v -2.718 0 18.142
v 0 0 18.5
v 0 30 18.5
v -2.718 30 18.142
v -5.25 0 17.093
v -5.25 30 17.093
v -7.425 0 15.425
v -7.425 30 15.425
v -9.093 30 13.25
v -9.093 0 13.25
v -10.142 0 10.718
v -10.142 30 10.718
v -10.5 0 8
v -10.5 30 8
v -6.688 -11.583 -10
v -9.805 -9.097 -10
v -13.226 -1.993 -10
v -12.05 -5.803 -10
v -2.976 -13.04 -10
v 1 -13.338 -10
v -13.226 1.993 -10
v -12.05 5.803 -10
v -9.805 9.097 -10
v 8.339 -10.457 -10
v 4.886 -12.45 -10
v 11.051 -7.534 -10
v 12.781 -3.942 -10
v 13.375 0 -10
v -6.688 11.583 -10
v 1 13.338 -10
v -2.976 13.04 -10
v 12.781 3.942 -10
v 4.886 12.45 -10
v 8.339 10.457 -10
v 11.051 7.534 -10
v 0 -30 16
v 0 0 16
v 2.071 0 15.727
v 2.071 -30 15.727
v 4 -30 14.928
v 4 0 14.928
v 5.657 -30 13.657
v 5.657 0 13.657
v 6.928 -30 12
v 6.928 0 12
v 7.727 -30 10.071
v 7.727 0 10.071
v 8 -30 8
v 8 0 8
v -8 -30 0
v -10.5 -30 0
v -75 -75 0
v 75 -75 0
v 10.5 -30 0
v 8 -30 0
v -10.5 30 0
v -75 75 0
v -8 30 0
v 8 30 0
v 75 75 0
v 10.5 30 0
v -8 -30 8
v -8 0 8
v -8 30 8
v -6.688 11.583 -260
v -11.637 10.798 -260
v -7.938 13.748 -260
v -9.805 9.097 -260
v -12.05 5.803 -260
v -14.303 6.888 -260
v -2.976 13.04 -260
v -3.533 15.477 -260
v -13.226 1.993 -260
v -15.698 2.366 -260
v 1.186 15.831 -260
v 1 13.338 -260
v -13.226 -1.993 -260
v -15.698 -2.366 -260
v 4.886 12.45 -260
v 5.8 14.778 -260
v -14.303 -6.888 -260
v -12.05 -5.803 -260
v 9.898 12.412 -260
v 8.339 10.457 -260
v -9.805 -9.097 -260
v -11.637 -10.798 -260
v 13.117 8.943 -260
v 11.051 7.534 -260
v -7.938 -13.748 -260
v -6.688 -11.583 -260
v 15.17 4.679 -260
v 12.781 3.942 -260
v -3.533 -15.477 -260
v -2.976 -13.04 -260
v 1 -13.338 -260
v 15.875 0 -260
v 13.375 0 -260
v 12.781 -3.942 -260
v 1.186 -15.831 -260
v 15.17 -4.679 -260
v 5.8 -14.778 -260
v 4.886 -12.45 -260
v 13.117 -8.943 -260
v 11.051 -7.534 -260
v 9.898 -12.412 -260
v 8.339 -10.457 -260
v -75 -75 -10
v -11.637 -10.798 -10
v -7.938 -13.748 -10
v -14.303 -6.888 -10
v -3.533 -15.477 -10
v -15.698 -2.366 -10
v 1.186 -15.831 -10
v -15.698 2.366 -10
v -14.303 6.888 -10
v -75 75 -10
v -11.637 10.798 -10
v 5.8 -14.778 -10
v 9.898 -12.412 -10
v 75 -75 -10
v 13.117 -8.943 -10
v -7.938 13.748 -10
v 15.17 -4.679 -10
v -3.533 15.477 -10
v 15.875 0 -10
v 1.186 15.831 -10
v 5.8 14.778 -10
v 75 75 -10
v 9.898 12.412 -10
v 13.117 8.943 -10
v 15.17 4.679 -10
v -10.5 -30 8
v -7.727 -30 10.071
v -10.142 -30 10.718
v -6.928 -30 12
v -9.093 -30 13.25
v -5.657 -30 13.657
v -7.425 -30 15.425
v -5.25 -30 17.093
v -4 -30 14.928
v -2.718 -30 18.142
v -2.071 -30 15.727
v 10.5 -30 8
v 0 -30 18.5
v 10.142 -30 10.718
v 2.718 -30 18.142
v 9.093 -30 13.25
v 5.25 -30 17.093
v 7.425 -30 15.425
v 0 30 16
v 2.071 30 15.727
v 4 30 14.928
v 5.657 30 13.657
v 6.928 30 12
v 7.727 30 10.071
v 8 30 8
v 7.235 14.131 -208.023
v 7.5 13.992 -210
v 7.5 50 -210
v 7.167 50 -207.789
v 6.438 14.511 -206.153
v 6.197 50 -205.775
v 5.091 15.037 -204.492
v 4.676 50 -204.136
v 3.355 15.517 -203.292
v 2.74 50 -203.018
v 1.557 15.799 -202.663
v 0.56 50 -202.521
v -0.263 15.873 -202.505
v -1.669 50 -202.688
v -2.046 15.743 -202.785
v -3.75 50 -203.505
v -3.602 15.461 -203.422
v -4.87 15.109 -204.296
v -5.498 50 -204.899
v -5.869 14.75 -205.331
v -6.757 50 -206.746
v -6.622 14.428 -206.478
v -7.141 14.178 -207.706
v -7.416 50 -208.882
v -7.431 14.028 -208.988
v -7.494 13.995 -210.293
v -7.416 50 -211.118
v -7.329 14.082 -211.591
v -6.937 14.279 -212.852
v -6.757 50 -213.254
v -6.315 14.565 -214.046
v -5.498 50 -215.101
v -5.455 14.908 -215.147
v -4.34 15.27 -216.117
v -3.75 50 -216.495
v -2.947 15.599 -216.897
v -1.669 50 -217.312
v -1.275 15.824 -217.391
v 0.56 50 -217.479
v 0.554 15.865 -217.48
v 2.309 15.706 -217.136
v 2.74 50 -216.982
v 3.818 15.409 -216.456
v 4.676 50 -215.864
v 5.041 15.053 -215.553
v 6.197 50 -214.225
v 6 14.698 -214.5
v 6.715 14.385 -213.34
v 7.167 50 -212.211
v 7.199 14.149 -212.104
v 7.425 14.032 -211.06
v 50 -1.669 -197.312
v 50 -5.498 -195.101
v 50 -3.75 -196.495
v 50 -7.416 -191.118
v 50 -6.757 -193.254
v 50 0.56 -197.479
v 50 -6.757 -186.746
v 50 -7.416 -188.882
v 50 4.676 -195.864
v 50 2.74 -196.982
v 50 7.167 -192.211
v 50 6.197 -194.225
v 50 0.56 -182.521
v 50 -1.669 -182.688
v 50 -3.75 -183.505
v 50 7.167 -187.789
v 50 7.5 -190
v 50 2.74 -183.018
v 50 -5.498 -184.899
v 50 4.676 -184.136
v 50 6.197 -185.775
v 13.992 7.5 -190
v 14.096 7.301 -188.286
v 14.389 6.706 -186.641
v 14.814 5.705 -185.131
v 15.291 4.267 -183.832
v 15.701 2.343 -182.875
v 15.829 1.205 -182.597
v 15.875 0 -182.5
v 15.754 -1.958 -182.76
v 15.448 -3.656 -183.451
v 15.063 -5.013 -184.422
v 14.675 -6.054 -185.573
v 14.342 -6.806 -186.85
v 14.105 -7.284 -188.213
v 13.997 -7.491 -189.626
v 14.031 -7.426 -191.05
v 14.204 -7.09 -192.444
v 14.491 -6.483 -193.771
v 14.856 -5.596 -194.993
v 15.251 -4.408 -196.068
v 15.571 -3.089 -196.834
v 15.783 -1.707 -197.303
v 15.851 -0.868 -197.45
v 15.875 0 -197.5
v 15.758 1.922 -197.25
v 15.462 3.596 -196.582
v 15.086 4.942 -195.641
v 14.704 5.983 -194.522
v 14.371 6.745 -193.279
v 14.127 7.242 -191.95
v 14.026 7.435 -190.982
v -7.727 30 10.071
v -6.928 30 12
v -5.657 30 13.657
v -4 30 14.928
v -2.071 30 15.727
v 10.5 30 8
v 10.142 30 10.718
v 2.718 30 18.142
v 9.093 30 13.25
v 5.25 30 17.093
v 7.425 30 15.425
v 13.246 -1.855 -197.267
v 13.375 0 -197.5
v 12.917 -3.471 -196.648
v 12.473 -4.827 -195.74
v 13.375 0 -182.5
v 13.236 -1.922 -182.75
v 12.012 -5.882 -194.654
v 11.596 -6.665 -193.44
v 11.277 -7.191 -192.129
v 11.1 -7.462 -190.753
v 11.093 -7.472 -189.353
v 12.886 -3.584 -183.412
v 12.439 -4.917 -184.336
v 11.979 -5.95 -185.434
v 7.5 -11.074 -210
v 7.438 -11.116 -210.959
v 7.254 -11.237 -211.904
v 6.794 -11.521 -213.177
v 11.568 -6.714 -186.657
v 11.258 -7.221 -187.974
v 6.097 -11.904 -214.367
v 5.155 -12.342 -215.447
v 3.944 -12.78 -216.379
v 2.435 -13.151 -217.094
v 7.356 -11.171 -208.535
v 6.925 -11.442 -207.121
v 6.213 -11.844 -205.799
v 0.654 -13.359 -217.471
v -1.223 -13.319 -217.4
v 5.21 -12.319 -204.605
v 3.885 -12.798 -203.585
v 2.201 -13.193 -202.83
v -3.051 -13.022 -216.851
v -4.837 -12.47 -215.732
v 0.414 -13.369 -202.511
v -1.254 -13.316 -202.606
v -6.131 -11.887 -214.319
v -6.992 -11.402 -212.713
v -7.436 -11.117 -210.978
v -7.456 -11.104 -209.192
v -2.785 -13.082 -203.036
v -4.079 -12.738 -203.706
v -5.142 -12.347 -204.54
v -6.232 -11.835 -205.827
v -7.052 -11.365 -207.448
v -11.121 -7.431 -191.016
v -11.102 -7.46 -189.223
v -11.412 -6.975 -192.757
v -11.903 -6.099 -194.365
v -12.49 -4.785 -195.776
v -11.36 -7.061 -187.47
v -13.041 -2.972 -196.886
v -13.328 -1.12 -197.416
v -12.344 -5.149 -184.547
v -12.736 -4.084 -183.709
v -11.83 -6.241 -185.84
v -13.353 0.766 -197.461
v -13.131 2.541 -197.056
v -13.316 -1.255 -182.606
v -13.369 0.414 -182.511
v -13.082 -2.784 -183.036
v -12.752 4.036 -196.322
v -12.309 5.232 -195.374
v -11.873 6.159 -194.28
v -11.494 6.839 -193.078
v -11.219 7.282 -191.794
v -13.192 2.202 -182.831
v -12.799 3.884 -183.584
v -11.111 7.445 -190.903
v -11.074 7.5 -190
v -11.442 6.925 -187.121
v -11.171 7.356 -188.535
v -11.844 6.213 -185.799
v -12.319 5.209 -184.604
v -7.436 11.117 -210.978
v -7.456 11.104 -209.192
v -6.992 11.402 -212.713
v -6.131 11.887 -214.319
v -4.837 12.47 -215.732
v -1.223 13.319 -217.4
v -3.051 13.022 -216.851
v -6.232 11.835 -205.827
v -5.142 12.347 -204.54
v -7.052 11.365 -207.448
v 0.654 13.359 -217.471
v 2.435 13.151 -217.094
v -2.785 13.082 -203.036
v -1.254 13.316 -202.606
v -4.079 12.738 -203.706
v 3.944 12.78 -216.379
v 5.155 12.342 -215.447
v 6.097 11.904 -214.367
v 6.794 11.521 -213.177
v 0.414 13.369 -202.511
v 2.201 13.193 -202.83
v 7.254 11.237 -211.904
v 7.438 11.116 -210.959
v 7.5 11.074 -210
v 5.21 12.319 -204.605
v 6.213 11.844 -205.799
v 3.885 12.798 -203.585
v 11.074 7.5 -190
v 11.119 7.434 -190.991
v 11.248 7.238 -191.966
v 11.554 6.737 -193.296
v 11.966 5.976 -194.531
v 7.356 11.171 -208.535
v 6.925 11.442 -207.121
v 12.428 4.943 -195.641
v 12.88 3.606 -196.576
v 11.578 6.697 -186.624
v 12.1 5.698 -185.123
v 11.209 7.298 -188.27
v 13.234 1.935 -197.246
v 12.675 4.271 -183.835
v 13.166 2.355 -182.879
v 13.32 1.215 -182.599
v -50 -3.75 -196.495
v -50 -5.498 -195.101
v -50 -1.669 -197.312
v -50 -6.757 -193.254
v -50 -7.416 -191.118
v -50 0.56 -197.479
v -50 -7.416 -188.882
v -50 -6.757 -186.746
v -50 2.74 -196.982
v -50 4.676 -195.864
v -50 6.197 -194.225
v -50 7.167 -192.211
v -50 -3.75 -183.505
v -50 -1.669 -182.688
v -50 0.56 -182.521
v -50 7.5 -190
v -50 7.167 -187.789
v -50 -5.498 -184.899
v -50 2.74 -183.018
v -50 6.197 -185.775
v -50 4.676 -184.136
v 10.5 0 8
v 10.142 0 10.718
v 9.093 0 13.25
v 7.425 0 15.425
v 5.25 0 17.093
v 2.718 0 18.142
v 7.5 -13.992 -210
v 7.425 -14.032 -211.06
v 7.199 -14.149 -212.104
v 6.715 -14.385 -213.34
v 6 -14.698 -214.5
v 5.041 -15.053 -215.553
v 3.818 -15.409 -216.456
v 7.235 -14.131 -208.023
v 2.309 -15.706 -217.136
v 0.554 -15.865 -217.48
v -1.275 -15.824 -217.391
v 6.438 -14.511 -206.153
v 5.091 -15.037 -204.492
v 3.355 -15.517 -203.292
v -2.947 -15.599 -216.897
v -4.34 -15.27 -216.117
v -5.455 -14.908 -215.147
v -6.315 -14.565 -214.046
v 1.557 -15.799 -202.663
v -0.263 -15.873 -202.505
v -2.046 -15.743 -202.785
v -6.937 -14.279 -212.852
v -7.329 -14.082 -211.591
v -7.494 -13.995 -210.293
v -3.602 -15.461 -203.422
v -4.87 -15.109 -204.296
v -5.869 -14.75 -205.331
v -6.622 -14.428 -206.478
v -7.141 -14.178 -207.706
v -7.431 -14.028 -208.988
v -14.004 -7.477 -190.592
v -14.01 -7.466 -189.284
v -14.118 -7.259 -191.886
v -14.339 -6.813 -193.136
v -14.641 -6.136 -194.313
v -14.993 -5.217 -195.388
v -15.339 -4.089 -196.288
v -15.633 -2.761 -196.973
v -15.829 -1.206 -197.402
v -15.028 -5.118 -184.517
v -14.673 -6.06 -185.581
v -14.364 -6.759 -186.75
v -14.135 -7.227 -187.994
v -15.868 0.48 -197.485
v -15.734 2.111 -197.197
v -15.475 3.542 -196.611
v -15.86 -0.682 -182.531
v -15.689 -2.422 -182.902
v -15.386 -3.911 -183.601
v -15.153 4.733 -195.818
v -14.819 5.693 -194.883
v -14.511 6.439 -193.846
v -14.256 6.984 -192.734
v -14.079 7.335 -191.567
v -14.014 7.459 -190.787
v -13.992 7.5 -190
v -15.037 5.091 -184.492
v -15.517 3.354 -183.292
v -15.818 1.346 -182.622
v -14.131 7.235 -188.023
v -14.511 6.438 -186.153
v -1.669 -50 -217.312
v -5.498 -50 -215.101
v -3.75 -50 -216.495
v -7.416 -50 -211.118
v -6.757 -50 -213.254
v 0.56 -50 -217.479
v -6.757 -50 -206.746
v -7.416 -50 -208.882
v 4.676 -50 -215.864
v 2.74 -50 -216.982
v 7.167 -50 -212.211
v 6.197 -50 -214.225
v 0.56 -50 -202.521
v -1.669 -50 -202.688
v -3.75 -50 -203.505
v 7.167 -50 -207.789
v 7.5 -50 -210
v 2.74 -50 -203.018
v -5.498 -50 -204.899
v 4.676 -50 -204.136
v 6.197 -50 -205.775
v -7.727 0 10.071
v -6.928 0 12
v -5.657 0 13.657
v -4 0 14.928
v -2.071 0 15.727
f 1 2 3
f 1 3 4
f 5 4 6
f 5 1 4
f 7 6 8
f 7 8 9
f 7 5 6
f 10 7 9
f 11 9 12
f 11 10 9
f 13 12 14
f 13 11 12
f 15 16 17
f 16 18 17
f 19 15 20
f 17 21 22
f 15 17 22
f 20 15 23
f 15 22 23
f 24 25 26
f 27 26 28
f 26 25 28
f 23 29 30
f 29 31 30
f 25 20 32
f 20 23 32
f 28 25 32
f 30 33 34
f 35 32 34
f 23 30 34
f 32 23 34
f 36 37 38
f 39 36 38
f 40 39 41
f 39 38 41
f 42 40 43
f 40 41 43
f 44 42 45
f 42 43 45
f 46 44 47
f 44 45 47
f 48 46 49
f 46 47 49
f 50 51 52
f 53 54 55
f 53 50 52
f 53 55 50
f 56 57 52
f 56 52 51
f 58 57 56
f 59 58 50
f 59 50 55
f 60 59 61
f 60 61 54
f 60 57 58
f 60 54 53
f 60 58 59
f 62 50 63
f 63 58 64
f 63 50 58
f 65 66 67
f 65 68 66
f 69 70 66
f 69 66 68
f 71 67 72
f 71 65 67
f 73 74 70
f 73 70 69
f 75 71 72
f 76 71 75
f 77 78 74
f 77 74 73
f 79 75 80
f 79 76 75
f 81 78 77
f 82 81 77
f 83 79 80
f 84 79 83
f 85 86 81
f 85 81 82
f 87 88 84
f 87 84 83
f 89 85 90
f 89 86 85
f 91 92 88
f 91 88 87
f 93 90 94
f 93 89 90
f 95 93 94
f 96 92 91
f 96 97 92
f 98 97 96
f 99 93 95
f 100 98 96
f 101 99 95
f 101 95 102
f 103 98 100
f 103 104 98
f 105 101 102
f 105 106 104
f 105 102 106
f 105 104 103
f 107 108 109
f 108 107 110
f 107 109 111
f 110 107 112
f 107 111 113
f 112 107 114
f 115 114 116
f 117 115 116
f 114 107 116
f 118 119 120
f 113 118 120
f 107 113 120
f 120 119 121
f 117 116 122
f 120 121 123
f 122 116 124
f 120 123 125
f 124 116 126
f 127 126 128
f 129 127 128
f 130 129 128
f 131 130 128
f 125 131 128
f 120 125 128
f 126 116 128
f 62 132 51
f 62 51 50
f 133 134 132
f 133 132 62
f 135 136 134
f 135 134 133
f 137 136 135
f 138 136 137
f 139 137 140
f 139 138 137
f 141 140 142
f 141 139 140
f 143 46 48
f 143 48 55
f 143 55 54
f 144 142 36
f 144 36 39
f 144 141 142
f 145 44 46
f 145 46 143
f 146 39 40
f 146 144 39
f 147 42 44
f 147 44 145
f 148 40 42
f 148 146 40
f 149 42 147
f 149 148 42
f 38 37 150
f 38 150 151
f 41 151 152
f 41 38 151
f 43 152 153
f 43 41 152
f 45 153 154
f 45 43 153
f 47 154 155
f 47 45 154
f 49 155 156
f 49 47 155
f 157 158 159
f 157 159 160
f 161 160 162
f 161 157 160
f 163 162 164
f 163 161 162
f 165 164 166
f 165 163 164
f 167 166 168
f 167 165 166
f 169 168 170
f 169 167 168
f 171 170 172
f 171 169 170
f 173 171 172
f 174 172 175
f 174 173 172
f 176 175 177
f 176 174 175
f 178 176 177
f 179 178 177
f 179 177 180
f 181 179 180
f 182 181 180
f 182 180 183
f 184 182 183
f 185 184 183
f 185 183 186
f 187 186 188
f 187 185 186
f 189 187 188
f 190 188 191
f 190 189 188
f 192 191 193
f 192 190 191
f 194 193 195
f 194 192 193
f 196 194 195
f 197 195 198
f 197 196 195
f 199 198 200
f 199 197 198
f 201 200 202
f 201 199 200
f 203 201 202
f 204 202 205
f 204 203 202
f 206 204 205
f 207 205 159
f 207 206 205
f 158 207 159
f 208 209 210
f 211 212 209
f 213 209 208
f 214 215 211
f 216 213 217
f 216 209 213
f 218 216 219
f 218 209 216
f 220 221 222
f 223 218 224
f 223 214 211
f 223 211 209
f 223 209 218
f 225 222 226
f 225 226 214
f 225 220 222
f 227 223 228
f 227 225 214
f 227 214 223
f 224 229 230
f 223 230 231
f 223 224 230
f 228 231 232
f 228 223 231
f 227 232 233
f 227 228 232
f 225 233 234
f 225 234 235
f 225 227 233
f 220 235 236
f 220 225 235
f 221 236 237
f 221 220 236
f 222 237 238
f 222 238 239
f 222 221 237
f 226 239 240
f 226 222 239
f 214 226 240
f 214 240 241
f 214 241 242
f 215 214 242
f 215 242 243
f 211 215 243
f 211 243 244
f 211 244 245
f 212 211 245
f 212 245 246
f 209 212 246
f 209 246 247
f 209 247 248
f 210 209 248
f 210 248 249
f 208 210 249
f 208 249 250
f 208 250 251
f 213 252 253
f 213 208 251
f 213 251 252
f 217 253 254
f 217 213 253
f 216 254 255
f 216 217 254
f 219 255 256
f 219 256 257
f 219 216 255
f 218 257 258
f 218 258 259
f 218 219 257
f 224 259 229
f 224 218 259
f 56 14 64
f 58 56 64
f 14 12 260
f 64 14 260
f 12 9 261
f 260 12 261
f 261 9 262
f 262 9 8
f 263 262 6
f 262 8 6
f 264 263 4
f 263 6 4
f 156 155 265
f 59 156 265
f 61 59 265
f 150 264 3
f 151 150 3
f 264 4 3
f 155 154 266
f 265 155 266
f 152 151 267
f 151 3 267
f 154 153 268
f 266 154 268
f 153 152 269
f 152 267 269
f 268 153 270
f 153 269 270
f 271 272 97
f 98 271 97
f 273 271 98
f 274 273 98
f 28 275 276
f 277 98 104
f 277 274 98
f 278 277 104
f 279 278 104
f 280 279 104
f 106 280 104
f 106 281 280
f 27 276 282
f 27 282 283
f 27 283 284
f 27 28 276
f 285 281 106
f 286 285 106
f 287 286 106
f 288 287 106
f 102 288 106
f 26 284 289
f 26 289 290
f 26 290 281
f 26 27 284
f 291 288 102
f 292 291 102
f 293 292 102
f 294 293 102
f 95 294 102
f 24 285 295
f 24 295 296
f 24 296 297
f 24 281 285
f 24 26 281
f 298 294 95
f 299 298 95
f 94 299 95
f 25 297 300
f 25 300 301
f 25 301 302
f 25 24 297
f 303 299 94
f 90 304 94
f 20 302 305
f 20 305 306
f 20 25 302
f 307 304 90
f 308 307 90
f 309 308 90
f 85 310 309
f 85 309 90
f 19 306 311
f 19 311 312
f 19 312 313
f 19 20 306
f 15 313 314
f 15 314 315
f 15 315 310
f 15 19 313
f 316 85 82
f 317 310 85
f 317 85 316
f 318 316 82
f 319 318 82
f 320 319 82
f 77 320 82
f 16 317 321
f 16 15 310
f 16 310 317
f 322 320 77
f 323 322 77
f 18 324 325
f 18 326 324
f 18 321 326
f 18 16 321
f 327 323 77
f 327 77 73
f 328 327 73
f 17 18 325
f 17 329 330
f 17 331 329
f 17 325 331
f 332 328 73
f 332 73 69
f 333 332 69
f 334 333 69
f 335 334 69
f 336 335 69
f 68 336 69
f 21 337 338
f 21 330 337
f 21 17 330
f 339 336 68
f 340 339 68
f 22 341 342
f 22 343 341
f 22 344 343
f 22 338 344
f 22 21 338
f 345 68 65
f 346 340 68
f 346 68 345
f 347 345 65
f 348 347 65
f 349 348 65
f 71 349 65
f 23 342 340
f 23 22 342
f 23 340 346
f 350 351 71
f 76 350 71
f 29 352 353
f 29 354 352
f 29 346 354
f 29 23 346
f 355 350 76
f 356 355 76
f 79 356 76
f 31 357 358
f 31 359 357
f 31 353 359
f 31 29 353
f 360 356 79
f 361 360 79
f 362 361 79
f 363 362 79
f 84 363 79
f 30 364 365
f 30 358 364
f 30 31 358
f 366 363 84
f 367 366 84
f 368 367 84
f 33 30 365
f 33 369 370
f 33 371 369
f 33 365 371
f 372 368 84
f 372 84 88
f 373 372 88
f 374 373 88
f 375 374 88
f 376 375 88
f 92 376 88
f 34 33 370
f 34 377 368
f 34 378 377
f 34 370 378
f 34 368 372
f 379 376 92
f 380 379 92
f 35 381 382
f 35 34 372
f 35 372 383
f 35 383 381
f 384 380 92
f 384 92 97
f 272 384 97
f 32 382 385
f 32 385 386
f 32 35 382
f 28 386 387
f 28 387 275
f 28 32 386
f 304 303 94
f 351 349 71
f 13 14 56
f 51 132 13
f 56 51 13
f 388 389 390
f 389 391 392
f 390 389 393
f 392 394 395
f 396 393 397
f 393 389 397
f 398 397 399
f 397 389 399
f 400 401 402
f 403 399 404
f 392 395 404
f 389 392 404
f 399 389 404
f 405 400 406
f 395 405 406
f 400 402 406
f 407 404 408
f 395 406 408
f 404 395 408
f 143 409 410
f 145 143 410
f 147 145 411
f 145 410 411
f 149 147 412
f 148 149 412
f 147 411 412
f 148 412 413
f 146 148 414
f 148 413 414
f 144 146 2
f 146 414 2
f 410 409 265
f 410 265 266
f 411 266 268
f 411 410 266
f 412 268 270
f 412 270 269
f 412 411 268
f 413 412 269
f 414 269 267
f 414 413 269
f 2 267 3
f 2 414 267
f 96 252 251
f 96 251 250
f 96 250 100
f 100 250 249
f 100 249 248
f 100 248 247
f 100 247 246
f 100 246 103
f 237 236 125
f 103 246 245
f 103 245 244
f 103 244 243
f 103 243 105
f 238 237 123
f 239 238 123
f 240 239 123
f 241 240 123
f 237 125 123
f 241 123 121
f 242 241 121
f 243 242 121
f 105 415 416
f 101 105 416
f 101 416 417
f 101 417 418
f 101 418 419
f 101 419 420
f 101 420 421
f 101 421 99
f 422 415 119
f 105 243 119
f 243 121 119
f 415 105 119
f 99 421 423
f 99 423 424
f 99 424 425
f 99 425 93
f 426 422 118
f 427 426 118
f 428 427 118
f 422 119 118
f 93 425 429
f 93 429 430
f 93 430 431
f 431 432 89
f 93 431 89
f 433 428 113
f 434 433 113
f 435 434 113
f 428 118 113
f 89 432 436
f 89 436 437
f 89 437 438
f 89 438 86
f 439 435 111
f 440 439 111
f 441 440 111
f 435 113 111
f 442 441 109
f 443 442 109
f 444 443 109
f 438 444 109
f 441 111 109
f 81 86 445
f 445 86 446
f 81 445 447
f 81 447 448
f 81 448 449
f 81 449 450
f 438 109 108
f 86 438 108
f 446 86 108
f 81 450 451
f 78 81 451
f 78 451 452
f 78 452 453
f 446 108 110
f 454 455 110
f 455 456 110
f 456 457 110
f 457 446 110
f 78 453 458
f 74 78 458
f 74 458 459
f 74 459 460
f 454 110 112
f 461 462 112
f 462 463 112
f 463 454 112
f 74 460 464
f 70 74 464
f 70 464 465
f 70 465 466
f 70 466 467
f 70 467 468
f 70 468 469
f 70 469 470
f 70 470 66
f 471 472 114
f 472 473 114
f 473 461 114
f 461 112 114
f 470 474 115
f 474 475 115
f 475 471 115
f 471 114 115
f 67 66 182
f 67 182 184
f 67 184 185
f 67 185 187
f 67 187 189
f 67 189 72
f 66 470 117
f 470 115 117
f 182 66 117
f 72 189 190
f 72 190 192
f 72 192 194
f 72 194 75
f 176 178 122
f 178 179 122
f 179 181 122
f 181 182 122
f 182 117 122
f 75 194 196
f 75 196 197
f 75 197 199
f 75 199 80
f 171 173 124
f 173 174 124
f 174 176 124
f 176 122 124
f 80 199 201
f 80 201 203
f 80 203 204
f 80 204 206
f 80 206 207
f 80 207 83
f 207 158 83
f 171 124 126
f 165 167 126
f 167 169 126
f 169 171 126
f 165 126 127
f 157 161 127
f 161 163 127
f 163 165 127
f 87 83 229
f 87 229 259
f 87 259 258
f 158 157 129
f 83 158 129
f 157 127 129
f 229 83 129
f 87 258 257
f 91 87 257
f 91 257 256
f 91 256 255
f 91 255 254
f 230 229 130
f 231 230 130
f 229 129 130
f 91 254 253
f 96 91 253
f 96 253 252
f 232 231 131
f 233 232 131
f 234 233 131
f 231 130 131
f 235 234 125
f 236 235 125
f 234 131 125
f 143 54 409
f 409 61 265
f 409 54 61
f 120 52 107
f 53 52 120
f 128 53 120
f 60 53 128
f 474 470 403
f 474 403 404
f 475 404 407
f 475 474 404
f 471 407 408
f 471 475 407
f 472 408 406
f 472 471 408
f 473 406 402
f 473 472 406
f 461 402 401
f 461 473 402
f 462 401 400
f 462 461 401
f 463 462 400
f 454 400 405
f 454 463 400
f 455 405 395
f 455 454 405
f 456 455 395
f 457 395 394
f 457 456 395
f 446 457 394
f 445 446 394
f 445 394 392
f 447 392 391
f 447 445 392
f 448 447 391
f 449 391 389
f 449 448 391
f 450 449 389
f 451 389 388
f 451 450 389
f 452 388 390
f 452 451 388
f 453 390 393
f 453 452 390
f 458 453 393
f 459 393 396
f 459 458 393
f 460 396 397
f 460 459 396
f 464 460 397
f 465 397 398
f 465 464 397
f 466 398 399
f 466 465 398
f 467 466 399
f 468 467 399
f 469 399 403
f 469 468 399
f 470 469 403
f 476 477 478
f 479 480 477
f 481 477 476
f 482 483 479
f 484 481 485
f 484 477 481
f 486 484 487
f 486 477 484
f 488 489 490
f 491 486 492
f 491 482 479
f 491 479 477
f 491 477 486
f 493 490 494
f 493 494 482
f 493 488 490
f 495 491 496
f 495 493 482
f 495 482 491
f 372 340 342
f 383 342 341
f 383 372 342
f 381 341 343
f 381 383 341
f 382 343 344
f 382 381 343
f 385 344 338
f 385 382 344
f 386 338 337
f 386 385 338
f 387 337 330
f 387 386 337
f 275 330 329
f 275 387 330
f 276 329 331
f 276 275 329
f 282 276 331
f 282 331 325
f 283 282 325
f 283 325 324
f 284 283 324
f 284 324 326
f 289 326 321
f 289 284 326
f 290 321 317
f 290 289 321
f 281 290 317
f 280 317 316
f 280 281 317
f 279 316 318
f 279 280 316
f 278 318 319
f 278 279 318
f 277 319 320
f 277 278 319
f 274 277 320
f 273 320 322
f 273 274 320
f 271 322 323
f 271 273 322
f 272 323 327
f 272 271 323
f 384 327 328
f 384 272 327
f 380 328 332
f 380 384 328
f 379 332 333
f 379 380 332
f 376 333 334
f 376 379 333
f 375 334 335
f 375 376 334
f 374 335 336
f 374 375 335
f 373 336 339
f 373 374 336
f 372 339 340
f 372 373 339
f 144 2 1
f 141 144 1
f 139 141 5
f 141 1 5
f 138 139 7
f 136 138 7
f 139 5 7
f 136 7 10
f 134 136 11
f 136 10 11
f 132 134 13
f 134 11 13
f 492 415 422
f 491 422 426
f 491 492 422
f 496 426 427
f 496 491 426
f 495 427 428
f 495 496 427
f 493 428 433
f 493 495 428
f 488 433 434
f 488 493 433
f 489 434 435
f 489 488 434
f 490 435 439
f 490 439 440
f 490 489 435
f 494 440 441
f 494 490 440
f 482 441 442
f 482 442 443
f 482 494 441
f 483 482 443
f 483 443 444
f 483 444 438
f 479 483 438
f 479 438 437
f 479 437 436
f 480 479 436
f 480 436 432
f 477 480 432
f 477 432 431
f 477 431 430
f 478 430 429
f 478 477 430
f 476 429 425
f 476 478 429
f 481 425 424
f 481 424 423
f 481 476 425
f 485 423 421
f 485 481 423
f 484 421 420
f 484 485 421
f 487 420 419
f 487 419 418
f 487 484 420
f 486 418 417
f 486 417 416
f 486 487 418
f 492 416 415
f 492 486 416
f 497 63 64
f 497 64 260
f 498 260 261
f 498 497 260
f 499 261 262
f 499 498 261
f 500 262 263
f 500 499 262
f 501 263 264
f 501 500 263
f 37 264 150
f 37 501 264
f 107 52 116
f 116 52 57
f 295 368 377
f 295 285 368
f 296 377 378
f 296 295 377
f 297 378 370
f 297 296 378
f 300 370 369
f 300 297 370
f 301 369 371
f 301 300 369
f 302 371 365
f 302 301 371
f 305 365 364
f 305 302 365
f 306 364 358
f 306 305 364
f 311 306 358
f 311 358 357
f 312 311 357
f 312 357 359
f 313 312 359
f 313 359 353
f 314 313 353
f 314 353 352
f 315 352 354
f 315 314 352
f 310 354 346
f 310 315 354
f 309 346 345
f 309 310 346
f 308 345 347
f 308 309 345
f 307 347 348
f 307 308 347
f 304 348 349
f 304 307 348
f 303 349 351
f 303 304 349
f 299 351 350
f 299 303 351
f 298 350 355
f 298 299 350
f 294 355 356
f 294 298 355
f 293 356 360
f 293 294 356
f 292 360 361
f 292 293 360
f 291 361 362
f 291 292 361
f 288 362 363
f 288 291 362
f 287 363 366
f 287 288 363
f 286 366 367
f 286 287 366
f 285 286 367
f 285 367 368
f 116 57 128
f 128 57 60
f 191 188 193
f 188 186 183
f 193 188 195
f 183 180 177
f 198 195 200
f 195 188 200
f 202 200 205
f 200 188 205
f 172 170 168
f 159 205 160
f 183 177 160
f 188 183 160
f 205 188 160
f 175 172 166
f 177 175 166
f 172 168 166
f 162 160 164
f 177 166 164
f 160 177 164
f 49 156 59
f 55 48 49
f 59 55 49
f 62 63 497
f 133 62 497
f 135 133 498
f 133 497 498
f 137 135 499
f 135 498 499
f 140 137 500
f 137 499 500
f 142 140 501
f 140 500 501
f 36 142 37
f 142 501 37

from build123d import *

# Parameters (mm, degrees)
F0_W     = 150
F0_H     = 150
F1_DEPTH = 10
F2_R     = 15.875
F2_R_2   = 13.375
F3_DEPTH = 250
F4_R     = 7.5
F5_DEPTH = 50
F6_R     = 7.5
F7_DEPTH = 50
F9_DEPTH = 30


# Not quite as in the source:
# - a feature names something its author has since deleted; it is built from what else it names


with BuildPart() as f1:
    # F0 (on Top) → F1 (new body)
    with BuildSketch(Plane.XY):
        Rectangle(F0_W, F0_H)
    extrude(amount=-F1_DEPTH)

    # F2 (on face) → F3 (join)
    with BuildSketch(Plane(origin=(0, 0, -10), x_dir=(1, 0, 0), z_dir=(0, 0, -1))):
        Circle(F2_R)
        Circle(F2_R_2, mode=Mode.SUBTRACT)
    extrude(amount=F3_DEPTH)

    # F4 (on Front) → F5 (join, symmetric)
    with BuildSketch(Plane.XZ):
        with Locations((0, -210)):
            Circle(F4_R)
    extrude(amount=F5_DEPTH, both=True)

    # F6 (on Right) → F7 (join, symmetric)
    with BuildSketch(Plane.YZ):
        with Locations((0, -190)):
            Circle(F6_R)
    extrude(amount=F7_DEPTH, both=True)

    # F8 (on Front) → F9 (join, symmetric)
    with BuildSketch(Plane.XZ):
        with BuildLine():
            Line((-10.5, 8), (-10.5, 0))
            Line((-10.5, 0), (-8, 0))
            Line((-8, 0), (-8, 8))
            ThreePointArc((-8, 8), (-5.6568542495, 13.6568542495), (0, 16))
            ThreePointArc((0, 16), (5.6568542495, 13.6568542495), (8, 8))
            Line((8, 8), (8, 0))
            Line((8, 0), (10.5, 0))
            Line((10.5, 0), (10.5, 8))
            ThreePointArc((10.5, 8), (7.4246212025, 15.4246212025), (0, 18.5))
            ThreePointArc((0, 18.5), (-7.4246212025, 15.4246212025), (-10.5, 8))
        make_face()
    extrude(amount=F9_DEPTH, both=True)


solid = f1.part
